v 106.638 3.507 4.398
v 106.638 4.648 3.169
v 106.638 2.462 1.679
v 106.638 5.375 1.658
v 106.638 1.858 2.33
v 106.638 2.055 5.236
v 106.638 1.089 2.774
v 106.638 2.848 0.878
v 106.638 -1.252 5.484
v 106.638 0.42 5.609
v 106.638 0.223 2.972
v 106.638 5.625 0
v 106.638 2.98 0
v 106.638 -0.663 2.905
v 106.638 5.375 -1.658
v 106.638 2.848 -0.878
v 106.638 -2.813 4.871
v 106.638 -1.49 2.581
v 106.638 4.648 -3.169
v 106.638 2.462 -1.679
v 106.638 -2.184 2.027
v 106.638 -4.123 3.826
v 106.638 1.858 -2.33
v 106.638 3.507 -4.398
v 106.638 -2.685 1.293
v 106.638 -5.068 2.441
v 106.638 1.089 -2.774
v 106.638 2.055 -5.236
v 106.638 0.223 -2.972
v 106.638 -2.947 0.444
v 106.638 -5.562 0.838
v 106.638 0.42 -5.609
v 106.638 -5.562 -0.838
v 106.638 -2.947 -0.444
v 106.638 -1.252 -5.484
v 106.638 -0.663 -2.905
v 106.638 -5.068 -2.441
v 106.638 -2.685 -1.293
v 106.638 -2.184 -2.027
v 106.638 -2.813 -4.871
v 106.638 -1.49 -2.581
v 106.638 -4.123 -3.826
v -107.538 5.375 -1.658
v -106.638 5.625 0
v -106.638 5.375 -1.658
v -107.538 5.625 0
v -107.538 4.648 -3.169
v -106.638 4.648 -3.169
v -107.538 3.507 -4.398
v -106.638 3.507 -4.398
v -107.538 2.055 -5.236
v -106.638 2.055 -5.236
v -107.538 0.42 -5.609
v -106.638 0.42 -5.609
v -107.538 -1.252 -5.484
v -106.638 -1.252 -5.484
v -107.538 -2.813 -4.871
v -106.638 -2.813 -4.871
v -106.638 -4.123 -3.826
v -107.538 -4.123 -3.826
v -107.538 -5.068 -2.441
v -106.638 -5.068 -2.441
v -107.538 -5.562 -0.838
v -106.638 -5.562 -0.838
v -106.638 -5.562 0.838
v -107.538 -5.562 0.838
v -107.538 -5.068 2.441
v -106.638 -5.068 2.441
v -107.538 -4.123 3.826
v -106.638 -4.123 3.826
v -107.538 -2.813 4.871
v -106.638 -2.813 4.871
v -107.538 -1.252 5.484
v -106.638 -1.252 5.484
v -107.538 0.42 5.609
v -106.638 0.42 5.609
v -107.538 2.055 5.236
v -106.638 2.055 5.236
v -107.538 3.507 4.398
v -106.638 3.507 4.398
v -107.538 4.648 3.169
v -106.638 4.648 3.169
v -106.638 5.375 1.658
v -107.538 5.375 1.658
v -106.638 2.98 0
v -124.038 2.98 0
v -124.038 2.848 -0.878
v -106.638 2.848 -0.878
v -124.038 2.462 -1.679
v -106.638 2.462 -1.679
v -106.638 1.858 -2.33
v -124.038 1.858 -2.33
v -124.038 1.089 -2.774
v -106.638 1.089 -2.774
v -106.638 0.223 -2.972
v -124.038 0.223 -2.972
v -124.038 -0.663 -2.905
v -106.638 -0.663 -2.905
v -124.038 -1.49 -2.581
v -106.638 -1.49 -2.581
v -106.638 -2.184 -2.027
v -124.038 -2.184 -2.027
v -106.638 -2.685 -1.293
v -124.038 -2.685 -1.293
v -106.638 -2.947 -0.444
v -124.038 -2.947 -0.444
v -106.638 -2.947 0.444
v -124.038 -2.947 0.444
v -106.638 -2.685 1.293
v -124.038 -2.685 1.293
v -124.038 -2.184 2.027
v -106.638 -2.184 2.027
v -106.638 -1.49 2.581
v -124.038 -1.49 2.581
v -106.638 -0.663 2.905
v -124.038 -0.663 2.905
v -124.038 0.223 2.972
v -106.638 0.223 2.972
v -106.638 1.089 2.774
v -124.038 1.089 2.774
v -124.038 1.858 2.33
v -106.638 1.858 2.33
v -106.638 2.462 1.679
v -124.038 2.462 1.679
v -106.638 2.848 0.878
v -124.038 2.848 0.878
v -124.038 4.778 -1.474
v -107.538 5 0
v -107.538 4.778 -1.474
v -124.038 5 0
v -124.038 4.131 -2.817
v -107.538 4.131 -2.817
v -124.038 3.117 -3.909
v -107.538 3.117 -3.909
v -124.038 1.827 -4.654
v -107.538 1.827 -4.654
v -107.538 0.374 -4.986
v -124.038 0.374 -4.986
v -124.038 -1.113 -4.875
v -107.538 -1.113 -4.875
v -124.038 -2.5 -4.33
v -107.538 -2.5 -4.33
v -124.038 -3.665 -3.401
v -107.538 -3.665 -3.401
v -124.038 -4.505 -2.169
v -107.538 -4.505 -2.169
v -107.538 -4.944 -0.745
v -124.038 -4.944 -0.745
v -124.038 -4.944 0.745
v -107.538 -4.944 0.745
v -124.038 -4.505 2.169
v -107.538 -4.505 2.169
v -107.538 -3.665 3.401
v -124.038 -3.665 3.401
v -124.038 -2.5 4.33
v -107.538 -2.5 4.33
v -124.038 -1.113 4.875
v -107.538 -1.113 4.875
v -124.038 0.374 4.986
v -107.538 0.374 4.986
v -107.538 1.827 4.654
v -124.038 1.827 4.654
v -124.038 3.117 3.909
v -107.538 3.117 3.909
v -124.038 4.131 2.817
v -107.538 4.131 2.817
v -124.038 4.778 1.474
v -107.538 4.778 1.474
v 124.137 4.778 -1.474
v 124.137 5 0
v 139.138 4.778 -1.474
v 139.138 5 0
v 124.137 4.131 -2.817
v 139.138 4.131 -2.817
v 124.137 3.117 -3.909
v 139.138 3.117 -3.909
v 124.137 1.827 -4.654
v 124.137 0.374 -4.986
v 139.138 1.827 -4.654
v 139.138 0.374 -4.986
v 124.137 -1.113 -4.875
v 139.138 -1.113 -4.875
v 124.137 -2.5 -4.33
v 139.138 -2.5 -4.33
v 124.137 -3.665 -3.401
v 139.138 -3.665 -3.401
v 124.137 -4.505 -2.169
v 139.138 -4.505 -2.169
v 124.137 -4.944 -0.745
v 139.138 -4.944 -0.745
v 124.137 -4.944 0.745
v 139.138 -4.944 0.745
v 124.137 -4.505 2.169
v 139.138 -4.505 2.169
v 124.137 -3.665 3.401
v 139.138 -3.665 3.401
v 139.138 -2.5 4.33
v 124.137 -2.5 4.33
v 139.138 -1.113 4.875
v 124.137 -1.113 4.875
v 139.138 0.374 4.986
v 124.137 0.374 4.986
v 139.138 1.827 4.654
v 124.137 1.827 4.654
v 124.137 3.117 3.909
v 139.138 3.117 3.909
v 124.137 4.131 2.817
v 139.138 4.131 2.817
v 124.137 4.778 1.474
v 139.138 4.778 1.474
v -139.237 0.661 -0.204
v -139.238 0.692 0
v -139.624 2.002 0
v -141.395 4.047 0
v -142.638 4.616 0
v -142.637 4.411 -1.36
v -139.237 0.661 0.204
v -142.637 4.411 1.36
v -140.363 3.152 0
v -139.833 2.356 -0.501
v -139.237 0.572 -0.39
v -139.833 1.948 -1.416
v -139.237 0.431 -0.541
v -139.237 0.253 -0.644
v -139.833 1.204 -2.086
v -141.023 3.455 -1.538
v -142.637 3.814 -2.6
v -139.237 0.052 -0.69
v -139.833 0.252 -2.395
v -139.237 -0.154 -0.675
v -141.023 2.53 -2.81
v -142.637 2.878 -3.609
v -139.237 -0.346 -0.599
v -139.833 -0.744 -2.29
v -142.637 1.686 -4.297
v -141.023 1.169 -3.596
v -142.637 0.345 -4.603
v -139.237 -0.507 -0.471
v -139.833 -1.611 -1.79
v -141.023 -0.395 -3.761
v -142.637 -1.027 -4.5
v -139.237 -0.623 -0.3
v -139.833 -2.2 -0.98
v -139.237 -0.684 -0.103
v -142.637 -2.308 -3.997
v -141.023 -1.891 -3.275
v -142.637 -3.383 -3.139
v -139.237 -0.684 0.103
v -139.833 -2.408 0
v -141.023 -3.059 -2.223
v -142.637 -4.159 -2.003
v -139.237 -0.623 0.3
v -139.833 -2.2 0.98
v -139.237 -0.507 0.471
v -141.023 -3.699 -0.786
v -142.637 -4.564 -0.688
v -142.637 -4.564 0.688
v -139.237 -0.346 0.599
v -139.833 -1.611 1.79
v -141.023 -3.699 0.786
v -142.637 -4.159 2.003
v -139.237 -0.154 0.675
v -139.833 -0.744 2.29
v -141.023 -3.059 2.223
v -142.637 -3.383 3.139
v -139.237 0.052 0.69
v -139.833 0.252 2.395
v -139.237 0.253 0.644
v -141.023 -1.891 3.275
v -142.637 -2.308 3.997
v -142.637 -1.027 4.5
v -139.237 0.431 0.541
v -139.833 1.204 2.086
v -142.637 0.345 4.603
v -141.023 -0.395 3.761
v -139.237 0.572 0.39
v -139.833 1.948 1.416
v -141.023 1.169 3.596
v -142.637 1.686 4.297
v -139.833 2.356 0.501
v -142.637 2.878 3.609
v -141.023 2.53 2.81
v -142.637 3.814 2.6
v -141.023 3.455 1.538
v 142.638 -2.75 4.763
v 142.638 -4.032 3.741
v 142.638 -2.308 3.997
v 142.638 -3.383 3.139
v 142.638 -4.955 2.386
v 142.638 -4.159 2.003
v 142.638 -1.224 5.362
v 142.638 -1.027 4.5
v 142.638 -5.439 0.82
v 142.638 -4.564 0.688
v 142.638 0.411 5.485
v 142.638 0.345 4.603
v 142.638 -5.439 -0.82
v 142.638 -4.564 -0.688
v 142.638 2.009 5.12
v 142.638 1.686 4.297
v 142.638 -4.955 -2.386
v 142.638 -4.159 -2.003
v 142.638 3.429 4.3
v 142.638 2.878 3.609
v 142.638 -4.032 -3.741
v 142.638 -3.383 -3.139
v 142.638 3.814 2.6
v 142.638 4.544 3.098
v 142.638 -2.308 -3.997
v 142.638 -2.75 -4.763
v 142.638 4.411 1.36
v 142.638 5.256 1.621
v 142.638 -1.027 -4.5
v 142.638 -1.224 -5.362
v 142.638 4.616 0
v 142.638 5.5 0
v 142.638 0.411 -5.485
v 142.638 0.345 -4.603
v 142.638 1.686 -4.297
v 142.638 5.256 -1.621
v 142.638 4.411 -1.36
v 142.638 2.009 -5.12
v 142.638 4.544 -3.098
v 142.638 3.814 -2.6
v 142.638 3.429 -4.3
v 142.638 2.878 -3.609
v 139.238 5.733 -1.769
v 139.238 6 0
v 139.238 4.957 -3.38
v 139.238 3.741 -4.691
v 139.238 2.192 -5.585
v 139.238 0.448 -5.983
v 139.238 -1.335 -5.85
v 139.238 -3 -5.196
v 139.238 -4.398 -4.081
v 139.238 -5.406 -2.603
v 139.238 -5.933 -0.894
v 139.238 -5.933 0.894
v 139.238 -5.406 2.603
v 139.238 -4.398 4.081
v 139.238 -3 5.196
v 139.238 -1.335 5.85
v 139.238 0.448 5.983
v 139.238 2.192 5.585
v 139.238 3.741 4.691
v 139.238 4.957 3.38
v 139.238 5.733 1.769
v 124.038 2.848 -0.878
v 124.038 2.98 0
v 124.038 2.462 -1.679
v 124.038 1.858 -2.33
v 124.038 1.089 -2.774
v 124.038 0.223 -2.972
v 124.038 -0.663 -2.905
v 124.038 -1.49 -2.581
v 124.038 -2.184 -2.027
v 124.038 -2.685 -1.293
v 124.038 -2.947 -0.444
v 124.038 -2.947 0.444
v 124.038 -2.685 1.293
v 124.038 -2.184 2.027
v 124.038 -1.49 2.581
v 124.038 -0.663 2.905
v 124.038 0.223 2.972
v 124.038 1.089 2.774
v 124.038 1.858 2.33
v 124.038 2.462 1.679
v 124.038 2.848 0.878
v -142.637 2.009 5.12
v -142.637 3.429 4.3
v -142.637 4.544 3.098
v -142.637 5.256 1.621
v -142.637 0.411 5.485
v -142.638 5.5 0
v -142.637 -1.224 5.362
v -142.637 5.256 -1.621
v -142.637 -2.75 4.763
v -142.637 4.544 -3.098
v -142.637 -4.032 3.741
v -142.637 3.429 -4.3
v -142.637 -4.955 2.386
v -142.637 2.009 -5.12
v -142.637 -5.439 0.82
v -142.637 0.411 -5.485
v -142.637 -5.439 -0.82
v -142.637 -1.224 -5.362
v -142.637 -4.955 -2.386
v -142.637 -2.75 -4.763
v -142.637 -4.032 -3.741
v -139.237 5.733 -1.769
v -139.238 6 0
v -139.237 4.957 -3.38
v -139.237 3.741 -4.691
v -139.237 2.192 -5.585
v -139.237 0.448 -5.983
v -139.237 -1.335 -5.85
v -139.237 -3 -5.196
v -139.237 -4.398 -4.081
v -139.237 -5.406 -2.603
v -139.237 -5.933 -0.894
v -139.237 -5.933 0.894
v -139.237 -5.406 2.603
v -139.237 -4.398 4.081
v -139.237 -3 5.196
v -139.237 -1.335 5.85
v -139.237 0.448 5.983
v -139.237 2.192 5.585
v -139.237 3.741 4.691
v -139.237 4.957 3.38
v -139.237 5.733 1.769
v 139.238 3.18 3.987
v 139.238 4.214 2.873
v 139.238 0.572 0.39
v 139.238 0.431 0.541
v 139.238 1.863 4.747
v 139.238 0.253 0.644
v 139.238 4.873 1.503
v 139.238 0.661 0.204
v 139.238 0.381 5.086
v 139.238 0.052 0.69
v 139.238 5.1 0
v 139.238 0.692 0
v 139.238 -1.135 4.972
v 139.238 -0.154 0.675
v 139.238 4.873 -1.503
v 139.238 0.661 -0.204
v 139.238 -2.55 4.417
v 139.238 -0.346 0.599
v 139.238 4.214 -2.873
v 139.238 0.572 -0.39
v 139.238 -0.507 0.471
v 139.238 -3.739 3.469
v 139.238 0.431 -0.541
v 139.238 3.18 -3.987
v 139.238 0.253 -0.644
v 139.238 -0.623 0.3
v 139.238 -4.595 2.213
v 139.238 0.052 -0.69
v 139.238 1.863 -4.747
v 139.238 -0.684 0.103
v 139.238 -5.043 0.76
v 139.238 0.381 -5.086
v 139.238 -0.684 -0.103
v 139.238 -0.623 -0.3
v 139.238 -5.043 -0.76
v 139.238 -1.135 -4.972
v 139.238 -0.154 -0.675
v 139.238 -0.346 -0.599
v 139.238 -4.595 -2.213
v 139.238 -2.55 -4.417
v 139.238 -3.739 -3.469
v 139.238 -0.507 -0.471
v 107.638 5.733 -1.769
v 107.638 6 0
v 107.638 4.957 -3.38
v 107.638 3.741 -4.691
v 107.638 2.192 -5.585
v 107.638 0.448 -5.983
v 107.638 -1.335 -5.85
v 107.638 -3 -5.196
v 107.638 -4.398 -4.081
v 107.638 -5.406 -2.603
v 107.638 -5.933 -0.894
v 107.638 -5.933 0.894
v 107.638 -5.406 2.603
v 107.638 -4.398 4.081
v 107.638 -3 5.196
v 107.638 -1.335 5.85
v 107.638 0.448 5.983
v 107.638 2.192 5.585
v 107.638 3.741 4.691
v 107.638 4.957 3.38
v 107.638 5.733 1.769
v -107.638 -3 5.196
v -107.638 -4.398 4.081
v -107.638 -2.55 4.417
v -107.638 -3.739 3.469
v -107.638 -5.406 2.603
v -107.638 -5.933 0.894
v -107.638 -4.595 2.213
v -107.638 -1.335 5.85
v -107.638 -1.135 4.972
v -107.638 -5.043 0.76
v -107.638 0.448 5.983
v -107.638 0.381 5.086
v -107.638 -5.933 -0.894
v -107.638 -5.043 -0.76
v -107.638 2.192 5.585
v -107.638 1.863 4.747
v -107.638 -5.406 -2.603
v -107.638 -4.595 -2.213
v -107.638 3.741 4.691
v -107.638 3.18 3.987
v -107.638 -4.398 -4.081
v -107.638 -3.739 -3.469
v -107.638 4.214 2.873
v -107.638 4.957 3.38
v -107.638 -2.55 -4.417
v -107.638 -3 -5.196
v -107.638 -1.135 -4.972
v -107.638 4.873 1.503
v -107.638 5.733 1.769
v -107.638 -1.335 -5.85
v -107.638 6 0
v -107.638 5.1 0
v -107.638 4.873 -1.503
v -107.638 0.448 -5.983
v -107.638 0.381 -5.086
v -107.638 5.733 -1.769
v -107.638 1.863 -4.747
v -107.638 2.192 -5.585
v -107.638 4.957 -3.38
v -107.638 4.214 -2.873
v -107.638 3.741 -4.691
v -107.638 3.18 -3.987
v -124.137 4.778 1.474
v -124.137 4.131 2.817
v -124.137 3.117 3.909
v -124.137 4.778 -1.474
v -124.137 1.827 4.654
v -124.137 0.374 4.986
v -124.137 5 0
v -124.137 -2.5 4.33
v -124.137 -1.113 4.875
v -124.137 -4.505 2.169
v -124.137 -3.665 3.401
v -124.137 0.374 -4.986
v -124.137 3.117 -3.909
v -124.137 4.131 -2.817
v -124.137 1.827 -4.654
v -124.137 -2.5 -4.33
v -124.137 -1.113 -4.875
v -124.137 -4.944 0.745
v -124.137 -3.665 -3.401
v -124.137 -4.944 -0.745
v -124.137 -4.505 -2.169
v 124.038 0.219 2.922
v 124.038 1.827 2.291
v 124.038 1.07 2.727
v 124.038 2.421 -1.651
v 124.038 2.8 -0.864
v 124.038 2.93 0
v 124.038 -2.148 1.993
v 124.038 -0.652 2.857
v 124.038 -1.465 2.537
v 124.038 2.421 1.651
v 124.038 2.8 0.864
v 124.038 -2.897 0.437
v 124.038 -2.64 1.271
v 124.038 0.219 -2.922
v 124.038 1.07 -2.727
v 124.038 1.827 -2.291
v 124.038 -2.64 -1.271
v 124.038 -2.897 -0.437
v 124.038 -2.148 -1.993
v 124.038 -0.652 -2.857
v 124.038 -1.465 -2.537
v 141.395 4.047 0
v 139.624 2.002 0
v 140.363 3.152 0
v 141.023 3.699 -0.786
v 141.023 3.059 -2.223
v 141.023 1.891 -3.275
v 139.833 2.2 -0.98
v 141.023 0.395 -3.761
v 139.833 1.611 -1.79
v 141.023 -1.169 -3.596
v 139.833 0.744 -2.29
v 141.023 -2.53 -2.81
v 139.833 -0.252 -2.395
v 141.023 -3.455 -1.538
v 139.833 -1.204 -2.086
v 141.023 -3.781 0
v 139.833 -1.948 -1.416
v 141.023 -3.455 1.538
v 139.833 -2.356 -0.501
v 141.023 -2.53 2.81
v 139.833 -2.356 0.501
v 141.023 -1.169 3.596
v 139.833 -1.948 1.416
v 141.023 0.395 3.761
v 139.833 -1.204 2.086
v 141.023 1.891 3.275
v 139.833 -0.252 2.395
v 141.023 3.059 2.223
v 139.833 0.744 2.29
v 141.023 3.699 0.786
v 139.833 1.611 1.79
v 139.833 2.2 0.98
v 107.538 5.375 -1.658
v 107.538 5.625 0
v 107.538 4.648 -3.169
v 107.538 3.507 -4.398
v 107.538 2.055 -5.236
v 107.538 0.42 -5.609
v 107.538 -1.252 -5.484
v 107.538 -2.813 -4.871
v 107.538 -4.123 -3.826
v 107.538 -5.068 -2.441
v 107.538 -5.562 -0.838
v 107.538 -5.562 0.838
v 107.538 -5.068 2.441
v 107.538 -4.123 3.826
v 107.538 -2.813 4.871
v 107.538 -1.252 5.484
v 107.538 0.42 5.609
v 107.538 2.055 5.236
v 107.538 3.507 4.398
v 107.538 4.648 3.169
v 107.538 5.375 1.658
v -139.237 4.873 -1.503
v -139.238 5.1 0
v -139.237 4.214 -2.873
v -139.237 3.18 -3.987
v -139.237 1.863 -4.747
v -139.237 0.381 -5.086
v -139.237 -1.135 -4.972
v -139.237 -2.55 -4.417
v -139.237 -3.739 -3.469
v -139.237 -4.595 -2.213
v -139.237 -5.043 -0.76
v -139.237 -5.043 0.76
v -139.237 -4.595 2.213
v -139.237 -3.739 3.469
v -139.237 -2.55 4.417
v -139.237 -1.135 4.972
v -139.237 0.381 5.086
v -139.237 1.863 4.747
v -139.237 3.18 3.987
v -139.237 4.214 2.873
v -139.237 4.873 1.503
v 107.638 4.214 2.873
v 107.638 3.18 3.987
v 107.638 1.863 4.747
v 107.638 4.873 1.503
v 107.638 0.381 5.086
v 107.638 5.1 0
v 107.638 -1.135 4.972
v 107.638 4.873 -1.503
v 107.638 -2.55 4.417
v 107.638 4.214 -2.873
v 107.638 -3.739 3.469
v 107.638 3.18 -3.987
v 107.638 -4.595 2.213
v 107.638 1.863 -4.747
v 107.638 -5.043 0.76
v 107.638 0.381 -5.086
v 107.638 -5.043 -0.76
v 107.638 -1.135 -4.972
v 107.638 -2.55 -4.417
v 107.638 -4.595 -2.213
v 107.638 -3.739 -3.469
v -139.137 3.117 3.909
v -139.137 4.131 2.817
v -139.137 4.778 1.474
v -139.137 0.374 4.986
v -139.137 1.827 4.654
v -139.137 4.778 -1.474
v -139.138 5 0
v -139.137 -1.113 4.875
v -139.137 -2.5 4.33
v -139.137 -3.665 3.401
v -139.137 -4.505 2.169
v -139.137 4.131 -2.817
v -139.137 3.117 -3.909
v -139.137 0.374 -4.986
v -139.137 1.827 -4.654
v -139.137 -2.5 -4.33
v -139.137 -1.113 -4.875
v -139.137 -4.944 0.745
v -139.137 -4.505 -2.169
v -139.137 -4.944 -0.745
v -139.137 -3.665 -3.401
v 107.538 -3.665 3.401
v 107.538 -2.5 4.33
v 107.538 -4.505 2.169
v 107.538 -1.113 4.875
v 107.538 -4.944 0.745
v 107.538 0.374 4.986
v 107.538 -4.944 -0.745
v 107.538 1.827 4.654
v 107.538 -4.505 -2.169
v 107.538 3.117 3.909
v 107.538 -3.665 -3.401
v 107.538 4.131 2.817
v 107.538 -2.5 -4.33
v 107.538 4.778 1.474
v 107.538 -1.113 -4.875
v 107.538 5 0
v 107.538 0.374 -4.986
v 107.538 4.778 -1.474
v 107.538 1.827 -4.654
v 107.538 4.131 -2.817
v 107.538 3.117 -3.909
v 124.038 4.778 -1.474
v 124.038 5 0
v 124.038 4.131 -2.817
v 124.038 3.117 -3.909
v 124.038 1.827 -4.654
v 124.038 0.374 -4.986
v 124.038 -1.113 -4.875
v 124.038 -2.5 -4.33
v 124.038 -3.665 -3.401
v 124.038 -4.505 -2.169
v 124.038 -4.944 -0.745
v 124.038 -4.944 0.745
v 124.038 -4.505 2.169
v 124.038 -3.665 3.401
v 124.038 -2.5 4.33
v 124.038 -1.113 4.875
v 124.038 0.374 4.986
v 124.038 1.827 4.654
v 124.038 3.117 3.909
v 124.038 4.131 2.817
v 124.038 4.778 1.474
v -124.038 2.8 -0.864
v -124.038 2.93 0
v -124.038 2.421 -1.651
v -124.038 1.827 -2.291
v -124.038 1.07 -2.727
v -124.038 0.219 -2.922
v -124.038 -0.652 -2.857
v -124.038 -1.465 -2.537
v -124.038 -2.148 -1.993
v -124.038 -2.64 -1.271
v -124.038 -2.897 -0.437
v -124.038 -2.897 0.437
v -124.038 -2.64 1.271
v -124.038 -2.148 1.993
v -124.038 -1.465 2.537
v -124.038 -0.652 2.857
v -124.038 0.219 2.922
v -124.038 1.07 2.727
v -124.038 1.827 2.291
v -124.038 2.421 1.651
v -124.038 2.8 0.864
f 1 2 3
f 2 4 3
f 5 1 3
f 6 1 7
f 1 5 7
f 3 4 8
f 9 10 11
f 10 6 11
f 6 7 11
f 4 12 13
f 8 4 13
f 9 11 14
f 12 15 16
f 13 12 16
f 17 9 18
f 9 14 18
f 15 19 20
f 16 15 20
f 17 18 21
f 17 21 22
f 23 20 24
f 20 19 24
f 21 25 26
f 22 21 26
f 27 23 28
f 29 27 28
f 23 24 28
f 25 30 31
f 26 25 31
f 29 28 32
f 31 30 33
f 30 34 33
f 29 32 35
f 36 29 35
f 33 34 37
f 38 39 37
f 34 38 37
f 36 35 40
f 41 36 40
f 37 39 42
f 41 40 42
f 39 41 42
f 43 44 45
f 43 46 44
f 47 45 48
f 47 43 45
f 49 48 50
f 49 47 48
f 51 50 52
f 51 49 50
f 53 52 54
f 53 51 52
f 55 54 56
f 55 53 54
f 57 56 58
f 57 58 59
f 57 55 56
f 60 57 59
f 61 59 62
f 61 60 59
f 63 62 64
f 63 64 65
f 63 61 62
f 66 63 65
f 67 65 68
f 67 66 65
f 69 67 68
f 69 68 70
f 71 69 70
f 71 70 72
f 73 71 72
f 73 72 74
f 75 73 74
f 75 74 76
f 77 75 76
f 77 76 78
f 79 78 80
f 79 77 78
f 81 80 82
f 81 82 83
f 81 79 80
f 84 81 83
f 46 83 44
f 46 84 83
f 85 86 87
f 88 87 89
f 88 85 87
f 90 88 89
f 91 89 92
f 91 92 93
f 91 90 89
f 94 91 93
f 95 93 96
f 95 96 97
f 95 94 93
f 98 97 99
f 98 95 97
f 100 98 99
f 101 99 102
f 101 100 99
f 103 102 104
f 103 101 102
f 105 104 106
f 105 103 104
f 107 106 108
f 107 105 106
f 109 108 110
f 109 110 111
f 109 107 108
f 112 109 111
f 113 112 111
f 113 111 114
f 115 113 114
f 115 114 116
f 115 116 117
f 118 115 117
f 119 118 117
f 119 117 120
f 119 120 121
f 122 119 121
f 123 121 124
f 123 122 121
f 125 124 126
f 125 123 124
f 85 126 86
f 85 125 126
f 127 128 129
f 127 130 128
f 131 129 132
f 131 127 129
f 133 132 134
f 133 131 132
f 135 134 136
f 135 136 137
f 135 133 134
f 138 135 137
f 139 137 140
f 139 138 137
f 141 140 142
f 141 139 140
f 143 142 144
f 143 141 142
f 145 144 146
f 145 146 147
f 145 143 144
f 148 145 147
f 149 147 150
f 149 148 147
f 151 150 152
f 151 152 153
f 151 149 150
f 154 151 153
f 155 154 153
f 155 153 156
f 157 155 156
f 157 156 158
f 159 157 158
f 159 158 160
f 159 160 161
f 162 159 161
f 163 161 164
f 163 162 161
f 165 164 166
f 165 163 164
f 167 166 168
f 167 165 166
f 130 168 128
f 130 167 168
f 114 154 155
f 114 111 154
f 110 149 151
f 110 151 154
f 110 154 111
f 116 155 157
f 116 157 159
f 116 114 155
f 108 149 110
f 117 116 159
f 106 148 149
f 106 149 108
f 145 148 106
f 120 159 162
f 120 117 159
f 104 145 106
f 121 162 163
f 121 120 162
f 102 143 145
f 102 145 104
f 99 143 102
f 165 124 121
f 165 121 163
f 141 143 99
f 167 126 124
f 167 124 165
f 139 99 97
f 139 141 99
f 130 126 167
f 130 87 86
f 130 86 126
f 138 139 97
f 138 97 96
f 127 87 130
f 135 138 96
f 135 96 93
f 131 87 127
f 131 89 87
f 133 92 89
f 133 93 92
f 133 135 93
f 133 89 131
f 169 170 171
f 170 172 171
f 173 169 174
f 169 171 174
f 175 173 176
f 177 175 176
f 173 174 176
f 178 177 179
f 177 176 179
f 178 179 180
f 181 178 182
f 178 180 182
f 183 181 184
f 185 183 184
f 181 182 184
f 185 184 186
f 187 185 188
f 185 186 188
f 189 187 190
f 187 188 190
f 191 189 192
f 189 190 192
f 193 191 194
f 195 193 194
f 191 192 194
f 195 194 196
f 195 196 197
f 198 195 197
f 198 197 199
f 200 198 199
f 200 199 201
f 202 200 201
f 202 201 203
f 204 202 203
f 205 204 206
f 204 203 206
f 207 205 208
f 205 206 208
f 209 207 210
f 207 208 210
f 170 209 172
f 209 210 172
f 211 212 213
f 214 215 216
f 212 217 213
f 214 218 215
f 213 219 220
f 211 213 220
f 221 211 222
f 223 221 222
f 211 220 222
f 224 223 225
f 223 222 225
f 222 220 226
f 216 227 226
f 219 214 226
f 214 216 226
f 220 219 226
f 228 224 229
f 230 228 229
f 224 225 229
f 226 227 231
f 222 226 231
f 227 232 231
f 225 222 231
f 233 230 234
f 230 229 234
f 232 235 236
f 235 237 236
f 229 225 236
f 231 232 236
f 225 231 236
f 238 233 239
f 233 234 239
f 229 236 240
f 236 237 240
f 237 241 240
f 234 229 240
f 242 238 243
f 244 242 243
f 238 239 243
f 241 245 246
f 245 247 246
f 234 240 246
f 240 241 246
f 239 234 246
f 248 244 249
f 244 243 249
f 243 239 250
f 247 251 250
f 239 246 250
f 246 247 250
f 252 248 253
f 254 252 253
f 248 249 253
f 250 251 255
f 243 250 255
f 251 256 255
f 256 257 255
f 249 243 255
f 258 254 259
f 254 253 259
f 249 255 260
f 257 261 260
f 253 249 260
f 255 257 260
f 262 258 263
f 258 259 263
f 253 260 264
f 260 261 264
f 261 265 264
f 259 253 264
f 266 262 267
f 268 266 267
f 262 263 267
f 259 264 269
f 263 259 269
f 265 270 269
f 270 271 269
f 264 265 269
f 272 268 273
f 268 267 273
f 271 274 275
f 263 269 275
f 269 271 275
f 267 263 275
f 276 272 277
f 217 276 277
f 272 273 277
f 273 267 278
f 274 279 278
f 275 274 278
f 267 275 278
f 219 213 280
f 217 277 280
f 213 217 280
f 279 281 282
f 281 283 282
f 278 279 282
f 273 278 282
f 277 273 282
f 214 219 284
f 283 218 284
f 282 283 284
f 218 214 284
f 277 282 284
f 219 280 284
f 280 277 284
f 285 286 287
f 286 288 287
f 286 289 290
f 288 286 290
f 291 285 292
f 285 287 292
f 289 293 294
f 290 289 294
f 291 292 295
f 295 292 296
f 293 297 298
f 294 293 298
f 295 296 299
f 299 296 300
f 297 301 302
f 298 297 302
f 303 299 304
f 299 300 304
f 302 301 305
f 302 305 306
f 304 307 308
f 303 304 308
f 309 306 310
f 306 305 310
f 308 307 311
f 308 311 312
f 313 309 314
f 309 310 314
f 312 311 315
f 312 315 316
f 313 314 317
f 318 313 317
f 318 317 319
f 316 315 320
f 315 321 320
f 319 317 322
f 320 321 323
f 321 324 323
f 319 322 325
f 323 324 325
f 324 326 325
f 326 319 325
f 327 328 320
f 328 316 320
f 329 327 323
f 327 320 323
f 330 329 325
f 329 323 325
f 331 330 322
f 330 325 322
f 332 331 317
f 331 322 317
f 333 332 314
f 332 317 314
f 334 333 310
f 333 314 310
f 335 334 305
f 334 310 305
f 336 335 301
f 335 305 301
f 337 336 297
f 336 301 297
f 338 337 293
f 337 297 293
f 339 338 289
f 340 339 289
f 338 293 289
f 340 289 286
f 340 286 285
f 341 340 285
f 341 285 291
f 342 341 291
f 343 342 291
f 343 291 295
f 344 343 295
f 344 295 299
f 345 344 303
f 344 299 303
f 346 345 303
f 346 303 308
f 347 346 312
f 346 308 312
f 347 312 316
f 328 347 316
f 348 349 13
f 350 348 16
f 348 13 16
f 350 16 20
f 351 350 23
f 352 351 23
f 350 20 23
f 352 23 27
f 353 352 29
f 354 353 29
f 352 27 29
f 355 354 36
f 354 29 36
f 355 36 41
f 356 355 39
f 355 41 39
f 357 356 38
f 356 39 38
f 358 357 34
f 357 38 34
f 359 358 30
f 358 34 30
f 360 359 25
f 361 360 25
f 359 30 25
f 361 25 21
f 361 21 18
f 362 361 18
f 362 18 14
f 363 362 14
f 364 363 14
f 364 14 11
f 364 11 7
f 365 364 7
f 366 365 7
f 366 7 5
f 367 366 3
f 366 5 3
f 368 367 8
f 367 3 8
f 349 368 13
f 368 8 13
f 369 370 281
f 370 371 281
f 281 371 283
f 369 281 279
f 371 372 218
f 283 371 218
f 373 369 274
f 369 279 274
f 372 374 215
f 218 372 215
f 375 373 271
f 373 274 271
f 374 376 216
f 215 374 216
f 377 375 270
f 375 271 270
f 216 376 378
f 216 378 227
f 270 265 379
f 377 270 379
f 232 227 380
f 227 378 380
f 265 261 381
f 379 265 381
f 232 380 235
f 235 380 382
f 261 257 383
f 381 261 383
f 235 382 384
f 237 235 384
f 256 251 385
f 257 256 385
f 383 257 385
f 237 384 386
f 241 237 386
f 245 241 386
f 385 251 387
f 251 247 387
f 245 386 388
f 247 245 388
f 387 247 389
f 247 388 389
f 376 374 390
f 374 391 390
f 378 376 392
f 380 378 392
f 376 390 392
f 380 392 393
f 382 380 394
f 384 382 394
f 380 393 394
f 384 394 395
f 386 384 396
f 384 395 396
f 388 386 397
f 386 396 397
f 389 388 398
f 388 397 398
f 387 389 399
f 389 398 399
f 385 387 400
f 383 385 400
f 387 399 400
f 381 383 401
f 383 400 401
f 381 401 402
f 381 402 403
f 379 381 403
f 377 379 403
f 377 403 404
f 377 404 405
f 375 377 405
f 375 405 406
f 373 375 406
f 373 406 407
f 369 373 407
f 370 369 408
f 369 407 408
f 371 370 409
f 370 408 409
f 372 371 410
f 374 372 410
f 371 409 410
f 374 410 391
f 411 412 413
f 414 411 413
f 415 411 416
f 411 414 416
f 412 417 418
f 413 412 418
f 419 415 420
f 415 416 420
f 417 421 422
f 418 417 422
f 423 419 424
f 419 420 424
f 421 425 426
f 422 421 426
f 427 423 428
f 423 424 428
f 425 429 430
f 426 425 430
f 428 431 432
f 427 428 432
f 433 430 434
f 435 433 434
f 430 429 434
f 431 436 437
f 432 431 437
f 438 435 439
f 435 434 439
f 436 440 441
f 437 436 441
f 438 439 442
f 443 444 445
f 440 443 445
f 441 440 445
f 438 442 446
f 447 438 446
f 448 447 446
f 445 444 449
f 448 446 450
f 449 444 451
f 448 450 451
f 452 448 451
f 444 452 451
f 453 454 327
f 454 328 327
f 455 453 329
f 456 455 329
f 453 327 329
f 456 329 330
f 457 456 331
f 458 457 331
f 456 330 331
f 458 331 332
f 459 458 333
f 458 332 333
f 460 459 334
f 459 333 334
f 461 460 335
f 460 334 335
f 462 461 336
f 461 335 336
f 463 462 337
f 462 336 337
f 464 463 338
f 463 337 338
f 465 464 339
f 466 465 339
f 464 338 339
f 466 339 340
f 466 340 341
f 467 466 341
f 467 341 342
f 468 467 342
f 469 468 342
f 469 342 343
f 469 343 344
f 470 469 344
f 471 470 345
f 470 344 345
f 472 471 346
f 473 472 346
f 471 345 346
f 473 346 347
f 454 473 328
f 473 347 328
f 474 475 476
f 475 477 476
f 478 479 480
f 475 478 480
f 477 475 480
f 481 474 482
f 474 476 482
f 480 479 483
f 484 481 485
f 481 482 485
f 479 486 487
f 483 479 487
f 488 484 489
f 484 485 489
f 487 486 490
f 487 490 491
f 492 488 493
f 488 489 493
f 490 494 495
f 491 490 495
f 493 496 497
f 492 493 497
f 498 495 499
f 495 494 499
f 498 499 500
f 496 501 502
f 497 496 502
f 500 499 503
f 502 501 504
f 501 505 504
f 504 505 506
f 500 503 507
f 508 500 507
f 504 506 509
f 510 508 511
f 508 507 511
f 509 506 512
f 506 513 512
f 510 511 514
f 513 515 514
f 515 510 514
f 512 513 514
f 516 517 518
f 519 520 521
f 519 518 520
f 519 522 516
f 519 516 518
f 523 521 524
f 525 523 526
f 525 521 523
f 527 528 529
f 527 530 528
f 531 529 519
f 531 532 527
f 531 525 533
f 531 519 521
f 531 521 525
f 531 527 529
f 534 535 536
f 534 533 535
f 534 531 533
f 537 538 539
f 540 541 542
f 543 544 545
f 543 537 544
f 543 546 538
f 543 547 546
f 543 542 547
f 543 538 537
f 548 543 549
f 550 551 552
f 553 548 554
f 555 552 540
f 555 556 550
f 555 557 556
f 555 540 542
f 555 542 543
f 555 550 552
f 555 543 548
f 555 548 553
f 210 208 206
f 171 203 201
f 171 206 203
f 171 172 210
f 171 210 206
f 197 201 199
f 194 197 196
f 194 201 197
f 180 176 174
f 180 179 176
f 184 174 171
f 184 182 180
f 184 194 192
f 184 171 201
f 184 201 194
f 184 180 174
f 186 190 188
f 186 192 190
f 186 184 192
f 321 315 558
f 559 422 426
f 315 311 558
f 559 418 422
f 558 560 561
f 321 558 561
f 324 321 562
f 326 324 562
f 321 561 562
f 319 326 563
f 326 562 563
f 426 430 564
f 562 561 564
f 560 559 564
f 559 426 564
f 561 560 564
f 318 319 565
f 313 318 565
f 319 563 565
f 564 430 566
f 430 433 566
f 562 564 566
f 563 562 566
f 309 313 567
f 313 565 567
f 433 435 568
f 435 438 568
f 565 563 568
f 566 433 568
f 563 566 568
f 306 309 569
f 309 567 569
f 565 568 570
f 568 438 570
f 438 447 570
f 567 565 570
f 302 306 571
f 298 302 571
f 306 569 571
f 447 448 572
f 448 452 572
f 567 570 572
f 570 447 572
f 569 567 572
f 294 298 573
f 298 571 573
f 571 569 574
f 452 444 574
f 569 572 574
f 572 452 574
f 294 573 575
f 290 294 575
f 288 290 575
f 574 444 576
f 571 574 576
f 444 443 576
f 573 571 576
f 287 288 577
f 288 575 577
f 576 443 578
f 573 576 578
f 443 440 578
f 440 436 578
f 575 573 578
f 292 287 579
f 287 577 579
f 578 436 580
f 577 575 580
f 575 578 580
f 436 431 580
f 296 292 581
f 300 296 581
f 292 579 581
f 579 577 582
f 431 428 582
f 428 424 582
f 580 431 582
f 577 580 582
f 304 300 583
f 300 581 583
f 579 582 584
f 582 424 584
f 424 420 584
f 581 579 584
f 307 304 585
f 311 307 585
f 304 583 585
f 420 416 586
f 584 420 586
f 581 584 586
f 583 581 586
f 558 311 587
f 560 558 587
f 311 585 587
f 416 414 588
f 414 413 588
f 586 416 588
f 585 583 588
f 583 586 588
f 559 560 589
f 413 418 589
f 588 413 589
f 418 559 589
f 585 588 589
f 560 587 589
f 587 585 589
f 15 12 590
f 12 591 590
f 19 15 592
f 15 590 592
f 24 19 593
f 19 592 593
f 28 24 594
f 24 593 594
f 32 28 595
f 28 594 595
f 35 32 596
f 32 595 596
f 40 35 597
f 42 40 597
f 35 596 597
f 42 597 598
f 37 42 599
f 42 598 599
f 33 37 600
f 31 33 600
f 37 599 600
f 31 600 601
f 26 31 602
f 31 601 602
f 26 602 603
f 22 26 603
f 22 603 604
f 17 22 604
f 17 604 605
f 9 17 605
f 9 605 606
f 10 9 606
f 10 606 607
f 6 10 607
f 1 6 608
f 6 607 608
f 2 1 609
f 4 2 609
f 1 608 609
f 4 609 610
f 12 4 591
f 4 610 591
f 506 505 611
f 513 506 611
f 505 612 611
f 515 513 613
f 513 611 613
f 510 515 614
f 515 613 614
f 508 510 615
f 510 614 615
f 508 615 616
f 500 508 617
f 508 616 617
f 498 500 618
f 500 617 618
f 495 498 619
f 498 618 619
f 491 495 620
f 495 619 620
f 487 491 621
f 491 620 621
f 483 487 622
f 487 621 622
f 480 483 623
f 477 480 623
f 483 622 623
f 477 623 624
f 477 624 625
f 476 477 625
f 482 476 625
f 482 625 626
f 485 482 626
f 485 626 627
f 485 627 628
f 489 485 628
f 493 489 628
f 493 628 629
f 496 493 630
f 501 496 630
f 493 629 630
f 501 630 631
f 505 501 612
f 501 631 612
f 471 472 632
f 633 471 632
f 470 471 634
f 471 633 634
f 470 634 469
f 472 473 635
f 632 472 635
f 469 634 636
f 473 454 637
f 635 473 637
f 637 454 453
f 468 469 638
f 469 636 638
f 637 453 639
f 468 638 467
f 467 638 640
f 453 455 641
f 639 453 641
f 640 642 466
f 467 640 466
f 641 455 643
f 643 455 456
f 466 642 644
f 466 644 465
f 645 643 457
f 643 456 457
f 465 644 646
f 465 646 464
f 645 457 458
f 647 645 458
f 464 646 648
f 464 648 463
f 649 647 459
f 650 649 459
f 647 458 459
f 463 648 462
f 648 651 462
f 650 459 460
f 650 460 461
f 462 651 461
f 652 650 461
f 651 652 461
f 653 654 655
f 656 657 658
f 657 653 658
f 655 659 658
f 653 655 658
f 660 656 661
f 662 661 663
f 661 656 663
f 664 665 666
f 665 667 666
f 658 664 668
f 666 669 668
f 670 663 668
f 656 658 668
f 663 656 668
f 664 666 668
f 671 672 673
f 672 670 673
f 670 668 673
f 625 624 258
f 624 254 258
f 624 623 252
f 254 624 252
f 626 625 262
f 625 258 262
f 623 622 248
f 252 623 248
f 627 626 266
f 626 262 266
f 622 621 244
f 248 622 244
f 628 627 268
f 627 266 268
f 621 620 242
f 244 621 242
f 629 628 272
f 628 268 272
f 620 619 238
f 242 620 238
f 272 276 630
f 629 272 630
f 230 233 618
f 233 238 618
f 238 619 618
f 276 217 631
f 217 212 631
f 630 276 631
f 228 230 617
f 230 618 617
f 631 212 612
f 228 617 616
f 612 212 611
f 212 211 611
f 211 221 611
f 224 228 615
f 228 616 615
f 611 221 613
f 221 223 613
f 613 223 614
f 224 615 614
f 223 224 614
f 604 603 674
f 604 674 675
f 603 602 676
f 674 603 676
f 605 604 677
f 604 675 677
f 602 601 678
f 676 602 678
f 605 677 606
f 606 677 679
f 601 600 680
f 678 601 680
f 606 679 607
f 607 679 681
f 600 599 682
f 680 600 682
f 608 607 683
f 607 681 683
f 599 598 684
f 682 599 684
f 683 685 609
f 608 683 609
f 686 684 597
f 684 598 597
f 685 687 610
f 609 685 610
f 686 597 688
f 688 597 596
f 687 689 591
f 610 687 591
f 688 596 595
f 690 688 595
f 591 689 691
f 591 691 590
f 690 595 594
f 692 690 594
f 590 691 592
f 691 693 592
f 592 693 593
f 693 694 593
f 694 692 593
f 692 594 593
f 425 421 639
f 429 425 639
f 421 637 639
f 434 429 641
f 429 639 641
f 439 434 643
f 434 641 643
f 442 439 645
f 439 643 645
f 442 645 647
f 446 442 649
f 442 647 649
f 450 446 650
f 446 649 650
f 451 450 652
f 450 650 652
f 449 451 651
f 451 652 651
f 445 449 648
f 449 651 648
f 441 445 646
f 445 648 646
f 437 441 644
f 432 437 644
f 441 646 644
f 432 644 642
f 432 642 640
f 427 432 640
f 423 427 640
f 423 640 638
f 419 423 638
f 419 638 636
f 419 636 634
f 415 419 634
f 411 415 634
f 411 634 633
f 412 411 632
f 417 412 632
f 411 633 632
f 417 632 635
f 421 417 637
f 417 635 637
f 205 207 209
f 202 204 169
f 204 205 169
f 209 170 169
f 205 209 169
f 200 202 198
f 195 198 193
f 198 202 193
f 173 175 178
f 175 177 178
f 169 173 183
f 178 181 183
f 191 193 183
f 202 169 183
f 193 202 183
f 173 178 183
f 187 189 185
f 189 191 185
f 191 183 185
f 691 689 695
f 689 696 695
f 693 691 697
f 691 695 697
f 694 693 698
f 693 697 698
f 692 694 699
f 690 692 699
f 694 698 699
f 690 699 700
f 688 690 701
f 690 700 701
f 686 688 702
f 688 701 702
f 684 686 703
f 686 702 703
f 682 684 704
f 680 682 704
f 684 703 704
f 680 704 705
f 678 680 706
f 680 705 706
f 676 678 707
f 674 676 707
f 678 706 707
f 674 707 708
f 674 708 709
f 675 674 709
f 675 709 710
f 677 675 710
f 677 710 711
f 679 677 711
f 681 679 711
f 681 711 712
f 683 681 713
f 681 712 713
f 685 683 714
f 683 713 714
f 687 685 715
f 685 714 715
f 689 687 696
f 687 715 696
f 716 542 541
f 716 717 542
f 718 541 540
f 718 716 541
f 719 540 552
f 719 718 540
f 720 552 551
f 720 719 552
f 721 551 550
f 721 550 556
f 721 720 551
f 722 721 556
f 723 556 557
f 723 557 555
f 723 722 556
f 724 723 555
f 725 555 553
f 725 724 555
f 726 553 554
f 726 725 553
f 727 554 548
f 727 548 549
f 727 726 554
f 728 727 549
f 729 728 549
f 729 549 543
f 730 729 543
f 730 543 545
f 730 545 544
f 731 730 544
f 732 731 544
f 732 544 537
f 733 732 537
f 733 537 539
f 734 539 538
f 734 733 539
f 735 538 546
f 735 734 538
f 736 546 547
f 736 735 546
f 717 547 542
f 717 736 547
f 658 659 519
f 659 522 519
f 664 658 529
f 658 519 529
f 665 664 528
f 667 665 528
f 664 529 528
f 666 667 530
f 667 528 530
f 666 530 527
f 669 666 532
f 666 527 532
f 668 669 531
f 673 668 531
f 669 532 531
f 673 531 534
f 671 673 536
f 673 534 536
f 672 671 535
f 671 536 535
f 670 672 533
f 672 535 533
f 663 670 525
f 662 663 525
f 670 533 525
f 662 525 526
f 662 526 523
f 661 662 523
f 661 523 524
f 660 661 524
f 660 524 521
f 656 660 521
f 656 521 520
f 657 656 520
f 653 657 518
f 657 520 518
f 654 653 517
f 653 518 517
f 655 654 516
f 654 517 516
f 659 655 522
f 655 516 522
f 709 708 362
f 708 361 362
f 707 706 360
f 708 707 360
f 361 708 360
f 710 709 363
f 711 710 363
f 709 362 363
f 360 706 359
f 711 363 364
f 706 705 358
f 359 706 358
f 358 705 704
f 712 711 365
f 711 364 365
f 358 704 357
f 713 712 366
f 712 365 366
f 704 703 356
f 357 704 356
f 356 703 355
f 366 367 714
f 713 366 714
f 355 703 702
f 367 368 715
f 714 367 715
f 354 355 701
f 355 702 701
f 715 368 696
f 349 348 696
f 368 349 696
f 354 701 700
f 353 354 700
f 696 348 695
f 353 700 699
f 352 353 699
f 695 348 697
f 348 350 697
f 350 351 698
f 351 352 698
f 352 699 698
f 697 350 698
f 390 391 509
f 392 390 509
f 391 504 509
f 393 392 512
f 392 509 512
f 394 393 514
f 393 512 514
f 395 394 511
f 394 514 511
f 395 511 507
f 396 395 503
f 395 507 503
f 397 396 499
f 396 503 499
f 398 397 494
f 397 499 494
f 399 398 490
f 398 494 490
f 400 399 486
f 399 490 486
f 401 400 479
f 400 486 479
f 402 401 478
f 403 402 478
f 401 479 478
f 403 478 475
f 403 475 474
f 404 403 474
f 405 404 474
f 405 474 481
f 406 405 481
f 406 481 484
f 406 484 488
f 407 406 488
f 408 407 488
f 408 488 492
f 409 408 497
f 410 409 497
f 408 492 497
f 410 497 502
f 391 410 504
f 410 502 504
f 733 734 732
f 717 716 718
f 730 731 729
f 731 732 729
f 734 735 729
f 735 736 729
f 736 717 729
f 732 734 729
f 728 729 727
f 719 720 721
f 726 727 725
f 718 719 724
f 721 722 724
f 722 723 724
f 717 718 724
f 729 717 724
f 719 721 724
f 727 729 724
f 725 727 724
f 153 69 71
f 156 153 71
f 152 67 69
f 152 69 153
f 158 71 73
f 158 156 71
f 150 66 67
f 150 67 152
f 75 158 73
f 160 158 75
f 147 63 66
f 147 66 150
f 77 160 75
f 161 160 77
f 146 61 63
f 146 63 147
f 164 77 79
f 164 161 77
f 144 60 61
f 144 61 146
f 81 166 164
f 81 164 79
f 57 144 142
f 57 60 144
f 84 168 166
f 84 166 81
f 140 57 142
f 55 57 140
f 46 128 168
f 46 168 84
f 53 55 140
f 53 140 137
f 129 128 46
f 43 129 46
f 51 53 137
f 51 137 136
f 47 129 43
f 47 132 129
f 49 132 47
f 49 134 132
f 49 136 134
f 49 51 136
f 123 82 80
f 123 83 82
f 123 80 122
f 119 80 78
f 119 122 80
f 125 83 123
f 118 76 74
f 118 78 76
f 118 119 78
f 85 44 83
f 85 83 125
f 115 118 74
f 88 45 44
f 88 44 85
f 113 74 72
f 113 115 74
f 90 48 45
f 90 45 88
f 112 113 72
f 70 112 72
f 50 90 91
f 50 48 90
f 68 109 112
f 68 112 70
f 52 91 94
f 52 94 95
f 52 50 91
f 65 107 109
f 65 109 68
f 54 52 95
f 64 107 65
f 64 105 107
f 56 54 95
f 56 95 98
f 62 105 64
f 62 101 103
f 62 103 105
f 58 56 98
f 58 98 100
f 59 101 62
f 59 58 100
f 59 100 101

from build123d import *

# Parameters (mm, degrees)
SKETCH1_W   = 15
SKETCH1_H   = 5
SKETCH1_W_2 = 124.0375
SKETCH1_H_2 = 2.93


with BuildPart() as part:
    # Sketch1 → Revolve1 (revolve)
    with BuildSketch(Plane.XY):
        with BuildLine():
            ThreePointArc((-139.2375, 0.691917625), (-140.363006151, 3.151576113), (-142.6375, 4.615598553))
            Line((-142.6375, 4.615598553), (-142.6375, 5.5))
            Line((-142.6375, 5.5), (-139.2375, 6))
            Line((-139.2375, 6), (-107.6375, 6))
            Line((-107.6375, 6), (-107.6375, 5.1))
            Line((-107.6375, 5.1), (-139.2375, 5.1))
            Line((-139.2375, 5.1), (-139.2375, 0.691917625))
        make_face()
        with Locations((-131.6375, 2.5)):
            Rectangle(SKETCH1_W, SKETCH1_H)
        Polygon((-124.0375, 5), (-124.0375, 2.98), (-106.6375, 2.98), (-106.6375, 5.625), (-107.5375, 5.625), (-107.5375, 5), align=None)
        with Locations((-62.01875, 1.465)):
            Rectangle(SKETCH1_W_2, SKETCH1_H_2)
        with Locations((62.01875, 1.465)):
            Rectangle(SKETCH1_W_2, SKETCH1_H_2)
        Polygon((106.6375, 2.98), (106.6375, 5.625), (107.5375, 5.625), (107.5375, 5), (124.0375, 5), (124.0375, 2.98), align=None)
        with BuildLine():
            Line((139.2375, 0.691917625), (139.2375, 5.1))
            Line((139.2375, 5.1), (107.6375, 5.1))
            Line((107.6375, 5.1), (107.6375, 6))
            Line((107.6375, 6), (139.2375, 6))
            Line((139.2375, 6), (142.6375, 5.5))
            Line((142.6375, 5.5), (142.6375, 4.615598553))
            ThreePointArc((142.6375, 4.615598553), (140.363006151, 3.151576113), (139.2375, 0.691917625))
        make_face()
        with Locations((131.6375, 2.5)):
            Rectangle(SKETCH1_W, SKETCH1_H)
    revolve(axis=Axis((124.0375, 0, 0), (-1, 0, 0)))


solid = part.part
